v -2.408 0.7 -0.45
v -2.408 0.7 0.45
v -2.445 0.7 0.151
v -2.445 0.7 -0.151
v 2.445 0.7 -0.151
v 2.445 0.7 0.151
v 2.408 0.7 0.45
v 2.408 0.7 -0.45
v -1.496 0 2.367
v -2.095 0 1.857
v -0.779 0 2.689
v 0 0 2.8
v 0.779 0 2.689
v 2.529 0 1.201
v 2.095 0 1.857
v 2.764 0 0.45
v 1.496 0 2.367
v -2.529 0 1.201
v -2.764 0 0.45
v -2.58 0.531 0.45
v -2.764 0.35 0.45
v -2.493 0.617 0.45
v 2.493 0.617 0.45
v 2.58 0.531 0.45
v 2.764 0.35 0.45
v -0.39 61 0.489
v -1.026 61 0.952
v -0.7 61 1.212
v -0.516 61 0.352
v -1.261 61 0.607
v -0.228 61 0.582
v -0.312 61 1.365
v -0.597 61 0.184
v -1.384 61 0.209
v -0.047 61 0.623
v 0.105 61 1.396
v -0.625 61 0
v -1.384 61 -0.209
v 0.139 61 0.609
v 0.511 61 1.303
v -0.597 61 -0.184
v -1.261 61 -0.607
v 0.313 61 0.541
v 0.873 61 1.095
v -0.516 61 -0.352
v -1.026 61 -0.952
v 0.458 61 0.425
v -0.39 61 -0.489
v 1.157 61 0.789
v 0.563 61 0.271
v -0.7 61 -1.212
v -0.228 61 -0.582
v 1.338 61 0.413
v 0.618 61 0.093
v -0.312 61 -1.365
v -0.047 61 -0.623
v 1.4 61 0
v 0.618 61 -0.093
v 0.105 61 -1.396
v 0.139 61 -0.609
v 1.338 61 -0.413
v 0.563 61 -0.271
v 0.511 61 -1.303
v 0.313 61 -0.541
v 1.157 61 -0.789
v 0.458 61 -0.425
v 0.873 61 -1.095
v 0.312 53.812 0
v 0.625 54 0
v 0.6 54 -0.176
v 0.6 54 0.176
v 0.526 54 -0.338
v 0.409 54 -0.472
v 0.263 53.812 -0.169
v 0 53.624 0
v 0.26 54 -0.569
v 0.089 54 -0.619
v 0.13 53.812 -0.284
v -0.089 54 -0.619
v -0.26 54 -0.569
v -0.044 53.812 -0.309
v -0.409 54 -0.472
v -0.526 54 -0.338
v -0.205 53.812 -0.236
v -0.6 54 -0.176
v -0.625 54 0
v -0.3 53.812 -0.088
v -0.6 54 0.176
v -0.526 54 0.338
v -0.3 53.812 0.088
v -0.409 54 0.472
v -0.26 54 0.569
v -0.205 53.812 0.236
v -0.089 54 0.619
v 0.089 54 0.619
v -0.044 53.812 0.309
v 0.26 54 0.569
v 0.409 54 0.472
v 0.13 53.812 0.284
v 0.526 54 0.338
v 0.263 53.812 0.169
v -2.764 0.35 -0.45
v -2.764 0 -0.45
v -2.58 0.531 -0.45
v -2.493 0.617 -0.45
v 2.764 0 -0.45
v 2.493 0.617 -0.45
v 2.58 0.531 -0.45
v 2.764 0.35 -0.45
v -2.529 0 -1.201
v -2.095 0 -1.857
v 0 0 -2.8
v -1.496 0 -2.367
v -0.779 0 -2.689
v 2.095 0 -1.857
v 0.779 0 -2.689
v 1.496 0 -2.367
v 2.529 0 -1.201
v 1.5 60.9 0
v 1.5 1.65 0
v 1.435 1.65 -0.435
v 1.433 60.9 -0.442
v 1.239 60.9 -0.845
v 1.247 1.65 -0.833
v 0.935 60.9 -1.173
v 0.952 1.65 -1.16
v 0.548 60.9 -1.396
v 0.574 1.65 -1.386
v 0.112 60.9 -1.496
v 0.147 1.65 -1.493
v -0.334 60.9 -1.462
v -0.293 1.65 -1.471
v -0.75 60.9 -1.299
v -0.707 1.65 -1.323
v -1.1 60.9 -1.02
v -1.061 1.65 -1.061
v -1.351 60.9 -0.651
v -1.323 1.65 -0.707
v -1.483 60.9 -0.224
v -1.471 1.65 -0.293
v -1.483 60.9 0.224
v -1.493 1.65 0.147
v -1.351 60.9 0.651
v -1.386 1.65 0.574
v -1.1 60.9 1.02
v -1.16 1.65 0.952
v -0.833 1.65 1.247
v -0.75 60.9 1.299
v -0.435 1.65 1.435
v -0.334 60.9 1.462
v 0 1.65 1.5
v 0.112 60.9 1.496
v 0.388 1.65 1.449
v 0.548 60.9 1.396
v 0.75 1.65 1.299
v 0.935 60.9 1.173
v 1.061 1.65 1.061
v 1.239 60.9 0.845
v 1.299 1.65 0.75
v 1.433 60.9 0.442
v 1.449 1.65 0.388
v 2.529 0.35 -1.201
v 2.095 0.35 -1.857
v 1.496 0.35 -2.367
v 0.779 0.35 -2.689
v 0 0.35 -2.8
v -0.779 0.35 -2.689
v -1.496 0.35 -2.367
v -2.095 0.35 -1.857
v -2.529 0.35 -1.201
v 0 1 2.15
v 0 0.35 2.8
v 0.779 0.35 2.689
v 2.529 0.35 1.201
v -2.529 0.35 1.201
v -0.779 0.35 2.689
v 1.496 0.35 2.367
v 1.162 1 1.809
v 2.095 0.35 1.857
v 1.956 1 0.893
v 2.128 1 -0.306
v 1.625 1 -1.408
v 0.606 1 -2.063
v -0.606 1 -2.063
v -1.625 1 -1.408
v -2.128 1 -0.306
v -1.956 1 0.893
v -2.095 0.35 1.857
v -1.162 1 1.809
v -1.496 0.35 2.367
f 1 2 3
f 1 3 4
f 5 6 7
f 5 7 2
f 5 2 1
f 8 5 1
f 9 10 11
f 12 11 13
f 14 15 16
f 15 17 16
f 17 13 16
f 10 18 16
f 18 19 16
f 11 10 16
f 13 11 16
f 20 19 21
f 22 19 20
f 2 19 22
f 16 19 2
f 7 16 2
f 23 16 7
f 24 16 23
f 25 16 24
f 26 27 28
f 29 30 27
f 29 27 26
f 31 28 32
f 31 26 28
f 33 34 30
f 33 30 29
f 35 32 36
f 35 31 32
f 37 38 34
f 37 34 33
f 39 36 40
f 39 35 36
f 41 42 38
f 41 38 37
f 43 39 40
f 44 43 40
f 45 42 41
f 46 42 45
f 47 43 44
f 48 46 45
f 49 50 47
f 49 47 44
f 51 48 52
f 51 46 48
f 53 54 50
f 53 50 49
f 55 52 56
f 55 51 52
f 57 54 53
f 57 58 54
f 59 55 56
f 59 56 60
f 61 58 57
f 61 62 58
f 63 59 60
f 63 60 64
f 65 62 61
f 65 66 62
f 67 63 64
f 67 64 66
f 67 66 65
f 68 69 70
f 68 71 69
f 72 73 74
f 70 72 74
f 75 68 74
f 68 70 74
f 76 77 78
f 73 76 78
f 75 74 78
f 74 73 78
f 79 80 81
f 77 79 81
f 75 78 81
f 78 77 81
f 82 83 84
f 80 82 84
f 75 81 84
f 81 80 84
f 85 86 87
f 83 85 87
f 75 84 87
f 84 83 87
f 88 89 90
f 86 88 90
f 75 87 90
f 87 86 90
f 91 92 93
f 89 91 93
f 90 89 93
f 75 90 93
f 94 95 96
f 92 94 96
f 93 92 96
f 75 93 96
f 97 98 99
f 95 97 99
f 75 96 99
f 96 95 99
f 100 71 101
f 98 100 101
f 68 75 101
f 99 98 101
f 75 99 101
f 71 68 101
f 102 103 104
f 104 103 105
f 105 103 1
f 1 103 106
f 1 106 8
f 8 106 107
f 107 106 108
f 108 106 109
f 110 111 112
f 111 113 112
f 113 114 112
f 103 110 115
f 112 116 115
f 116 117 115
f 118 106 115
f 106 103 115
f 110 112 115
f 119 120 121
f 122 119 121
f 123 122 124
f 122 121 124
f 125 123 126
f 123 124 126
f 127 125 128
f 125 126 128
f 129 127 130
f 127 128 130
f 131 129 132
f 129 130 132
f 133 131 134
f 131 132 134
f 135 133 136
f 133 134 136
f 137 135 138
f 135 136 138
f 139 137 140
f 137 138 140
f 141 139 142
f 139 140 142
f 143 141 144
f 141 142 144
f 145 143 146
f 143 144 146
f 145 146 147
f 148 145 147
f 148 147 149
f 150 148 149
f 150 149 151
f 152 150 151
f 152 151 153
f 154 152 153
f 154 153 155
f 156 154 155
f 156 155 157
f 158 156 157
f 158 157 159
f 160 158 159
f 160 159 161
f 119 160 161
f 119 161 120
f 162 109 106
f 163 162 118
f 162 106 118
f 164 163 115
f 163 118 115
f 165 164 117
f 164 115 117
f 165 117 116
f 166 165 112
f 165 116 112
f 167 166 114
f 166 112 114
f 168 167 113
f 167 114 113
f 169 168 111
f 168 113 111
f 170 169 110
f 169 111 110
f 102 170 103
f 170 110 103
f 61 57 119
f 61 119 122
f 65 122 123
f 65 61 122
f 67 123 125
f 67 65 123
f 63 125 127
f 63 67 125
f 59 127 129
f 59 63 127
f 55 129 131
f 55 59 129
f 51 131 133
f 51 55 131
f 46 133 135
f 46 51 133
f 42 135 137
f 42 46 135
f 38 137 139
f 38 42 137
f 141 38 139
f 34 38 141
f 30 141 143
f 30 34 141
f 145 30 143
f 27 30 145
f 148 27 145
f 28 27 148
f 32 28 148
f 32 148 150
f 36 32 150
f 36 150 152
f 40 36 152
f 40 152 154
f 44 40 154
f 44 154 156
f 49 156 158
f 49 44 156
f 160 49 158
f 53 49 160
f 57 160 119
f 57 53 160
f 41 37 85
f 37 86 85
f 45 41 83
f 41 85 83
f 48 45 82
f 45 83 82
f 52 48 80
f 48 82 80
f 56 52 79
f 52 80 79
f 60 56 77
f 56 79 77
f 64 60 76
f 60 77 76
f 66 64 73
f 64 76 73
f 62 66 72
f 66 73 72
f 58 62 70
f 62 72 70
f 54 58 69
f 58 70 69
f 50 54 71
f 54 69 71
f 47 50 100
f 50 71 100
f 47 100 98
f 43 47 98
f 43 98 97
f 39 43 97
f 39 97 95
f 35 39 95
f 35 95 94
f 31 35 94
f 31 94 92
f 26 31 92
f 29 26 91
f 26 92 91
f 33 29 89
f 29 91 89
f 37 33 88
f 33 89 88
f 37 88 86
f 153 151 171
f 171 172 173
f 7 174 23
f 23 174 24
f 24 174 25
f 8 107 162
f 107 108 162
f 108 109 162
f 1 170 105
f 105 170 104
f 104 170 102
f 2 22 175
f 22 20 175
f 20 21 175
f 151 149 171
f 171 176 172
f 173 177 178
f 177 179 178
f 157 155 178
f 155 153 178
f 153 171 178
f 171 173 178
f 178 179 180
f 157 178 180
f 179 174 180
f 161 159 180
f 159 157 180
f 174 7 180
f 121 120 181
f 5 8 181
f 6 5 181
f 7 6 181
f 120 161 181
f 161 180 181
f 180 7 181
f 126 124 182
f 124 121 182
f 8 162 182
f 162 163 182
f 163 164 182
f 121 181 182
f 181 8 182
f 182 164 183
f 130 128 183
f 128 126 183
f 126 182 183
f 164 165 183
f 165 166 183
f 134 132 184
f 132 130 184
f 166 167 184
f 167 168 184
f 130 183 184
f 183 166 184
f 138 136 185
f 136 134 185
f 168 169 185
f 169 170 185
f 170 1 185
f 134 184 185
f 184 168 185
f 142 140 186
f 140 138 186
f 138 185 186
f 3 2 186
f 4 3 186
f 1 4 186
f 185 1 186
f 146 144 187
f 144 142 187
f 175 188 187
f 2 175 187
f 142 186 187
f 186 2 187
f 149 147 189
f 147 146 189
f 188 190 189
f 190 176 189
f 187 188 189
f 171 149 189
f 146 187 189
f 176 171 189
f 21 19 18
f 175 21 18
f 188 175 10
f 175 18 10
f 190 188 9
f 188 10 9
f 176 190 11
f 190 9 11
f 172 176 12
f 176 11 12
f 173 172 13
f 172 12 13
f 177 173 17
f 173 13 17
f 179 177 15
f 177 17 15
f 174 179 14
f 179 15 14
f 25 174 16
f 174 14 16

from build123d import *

# Parameters (mm, degrees)
SKETCH_1_R               = 1.5
EXTRUDE_1_DEPTH          = 61
SKETCH_3_W               = 0.9
SKETCH_3_H               = 0.7
CUT_EXTRUDE_1_DEPTH      = 3.8
CUT_EXTRUDE_1_DEPTH_BACK = 3.8
CHAMFER_1_SIZE           = 0.1
HOLE_WIZARD_M1_61_D      = 1.25
HOLE_WIZARD_M1_61_DEPTH  = 7
HOLE_WIZARD_M1_61_TIP    = 0.375537887


with BuildPart() as part:
    # Эскиз1 → Бобышка-Вытянуть1 (new body)
    with BuildSketch(Plane(origin=(0, 0, 0), x_dir=(1, 0, 0), z_dir=(0, 1, 0))):
        Circle(SKETCH_1_R)
    extrude(amount=EXTRUDE_1_DEPTH)

    # Эскиз2 → Повернуть1 (revolve)
    with BuildSketch(Plane(origin=(0, 0, 0), x_dir=(0, 0, -1), z_dir=(1, 0, 0))):
        Polygon((0, 3.15), (-2.8, 0.35), (-2.8, 0), (0, 0), align=None)
    revolve(axis=Axis((0, 0, 0), (0, 1, 0)))

    # Эскиз3 → Вырез-Вытянуть1 (cut, two sides)
    with BuildSketch(Plane(origin=(0, 0, 0), x_dir=(0, 0, -1), z_dir=(1, 0, 0))) as cut_extrude_1_sk:
        with Locations((0, 0.35)):
            Rectangle(SKETCH_3_W, SKETCH_3_H)
    extrude(amount=CUT_EXTRUDE_1_DEPTH, mode=Mode.SUBTRACT)
    extrude(cut_extrude_1_sk.sketch, amount=-CUT_EXTRUDE_1_DEPTH_BACK, mode=Mode.SUBTRACT)

    # Фаска1
    chamfer_1_edges = [part.edges().sort_by_distance(p)[0] for p in [
        (-1.5, 61, 0),
    ]]
    chamfer(chamfer_1_edges, length=CHAMFER_1_SIZE)

    # Отверстие обработанное метчиком M1,61
    with Locations(Plane(origin=(0, 61, 0), x_dir=(1, 0, 0), z_dir=(0, 1, 0))):
        with Locations((0, 0)):
            Hole(HOLE_WIZARD_M1_61_D / 2, depth=HOLE_WIZARD_M1_61_DEPTH)
            with Locations((0, 0, -(HOLE_WIZARD_M1_61_DEPTH + HOLE_WIZARD_M1_61_TIP / 2))):  # 118° drill point
                Cone(0, HOLE_WIZARD_M1_61_D / 2, HOLE_WIZARD_M1_61_TIP, mode=Mode.SUBTRACT)


solid = part.part
